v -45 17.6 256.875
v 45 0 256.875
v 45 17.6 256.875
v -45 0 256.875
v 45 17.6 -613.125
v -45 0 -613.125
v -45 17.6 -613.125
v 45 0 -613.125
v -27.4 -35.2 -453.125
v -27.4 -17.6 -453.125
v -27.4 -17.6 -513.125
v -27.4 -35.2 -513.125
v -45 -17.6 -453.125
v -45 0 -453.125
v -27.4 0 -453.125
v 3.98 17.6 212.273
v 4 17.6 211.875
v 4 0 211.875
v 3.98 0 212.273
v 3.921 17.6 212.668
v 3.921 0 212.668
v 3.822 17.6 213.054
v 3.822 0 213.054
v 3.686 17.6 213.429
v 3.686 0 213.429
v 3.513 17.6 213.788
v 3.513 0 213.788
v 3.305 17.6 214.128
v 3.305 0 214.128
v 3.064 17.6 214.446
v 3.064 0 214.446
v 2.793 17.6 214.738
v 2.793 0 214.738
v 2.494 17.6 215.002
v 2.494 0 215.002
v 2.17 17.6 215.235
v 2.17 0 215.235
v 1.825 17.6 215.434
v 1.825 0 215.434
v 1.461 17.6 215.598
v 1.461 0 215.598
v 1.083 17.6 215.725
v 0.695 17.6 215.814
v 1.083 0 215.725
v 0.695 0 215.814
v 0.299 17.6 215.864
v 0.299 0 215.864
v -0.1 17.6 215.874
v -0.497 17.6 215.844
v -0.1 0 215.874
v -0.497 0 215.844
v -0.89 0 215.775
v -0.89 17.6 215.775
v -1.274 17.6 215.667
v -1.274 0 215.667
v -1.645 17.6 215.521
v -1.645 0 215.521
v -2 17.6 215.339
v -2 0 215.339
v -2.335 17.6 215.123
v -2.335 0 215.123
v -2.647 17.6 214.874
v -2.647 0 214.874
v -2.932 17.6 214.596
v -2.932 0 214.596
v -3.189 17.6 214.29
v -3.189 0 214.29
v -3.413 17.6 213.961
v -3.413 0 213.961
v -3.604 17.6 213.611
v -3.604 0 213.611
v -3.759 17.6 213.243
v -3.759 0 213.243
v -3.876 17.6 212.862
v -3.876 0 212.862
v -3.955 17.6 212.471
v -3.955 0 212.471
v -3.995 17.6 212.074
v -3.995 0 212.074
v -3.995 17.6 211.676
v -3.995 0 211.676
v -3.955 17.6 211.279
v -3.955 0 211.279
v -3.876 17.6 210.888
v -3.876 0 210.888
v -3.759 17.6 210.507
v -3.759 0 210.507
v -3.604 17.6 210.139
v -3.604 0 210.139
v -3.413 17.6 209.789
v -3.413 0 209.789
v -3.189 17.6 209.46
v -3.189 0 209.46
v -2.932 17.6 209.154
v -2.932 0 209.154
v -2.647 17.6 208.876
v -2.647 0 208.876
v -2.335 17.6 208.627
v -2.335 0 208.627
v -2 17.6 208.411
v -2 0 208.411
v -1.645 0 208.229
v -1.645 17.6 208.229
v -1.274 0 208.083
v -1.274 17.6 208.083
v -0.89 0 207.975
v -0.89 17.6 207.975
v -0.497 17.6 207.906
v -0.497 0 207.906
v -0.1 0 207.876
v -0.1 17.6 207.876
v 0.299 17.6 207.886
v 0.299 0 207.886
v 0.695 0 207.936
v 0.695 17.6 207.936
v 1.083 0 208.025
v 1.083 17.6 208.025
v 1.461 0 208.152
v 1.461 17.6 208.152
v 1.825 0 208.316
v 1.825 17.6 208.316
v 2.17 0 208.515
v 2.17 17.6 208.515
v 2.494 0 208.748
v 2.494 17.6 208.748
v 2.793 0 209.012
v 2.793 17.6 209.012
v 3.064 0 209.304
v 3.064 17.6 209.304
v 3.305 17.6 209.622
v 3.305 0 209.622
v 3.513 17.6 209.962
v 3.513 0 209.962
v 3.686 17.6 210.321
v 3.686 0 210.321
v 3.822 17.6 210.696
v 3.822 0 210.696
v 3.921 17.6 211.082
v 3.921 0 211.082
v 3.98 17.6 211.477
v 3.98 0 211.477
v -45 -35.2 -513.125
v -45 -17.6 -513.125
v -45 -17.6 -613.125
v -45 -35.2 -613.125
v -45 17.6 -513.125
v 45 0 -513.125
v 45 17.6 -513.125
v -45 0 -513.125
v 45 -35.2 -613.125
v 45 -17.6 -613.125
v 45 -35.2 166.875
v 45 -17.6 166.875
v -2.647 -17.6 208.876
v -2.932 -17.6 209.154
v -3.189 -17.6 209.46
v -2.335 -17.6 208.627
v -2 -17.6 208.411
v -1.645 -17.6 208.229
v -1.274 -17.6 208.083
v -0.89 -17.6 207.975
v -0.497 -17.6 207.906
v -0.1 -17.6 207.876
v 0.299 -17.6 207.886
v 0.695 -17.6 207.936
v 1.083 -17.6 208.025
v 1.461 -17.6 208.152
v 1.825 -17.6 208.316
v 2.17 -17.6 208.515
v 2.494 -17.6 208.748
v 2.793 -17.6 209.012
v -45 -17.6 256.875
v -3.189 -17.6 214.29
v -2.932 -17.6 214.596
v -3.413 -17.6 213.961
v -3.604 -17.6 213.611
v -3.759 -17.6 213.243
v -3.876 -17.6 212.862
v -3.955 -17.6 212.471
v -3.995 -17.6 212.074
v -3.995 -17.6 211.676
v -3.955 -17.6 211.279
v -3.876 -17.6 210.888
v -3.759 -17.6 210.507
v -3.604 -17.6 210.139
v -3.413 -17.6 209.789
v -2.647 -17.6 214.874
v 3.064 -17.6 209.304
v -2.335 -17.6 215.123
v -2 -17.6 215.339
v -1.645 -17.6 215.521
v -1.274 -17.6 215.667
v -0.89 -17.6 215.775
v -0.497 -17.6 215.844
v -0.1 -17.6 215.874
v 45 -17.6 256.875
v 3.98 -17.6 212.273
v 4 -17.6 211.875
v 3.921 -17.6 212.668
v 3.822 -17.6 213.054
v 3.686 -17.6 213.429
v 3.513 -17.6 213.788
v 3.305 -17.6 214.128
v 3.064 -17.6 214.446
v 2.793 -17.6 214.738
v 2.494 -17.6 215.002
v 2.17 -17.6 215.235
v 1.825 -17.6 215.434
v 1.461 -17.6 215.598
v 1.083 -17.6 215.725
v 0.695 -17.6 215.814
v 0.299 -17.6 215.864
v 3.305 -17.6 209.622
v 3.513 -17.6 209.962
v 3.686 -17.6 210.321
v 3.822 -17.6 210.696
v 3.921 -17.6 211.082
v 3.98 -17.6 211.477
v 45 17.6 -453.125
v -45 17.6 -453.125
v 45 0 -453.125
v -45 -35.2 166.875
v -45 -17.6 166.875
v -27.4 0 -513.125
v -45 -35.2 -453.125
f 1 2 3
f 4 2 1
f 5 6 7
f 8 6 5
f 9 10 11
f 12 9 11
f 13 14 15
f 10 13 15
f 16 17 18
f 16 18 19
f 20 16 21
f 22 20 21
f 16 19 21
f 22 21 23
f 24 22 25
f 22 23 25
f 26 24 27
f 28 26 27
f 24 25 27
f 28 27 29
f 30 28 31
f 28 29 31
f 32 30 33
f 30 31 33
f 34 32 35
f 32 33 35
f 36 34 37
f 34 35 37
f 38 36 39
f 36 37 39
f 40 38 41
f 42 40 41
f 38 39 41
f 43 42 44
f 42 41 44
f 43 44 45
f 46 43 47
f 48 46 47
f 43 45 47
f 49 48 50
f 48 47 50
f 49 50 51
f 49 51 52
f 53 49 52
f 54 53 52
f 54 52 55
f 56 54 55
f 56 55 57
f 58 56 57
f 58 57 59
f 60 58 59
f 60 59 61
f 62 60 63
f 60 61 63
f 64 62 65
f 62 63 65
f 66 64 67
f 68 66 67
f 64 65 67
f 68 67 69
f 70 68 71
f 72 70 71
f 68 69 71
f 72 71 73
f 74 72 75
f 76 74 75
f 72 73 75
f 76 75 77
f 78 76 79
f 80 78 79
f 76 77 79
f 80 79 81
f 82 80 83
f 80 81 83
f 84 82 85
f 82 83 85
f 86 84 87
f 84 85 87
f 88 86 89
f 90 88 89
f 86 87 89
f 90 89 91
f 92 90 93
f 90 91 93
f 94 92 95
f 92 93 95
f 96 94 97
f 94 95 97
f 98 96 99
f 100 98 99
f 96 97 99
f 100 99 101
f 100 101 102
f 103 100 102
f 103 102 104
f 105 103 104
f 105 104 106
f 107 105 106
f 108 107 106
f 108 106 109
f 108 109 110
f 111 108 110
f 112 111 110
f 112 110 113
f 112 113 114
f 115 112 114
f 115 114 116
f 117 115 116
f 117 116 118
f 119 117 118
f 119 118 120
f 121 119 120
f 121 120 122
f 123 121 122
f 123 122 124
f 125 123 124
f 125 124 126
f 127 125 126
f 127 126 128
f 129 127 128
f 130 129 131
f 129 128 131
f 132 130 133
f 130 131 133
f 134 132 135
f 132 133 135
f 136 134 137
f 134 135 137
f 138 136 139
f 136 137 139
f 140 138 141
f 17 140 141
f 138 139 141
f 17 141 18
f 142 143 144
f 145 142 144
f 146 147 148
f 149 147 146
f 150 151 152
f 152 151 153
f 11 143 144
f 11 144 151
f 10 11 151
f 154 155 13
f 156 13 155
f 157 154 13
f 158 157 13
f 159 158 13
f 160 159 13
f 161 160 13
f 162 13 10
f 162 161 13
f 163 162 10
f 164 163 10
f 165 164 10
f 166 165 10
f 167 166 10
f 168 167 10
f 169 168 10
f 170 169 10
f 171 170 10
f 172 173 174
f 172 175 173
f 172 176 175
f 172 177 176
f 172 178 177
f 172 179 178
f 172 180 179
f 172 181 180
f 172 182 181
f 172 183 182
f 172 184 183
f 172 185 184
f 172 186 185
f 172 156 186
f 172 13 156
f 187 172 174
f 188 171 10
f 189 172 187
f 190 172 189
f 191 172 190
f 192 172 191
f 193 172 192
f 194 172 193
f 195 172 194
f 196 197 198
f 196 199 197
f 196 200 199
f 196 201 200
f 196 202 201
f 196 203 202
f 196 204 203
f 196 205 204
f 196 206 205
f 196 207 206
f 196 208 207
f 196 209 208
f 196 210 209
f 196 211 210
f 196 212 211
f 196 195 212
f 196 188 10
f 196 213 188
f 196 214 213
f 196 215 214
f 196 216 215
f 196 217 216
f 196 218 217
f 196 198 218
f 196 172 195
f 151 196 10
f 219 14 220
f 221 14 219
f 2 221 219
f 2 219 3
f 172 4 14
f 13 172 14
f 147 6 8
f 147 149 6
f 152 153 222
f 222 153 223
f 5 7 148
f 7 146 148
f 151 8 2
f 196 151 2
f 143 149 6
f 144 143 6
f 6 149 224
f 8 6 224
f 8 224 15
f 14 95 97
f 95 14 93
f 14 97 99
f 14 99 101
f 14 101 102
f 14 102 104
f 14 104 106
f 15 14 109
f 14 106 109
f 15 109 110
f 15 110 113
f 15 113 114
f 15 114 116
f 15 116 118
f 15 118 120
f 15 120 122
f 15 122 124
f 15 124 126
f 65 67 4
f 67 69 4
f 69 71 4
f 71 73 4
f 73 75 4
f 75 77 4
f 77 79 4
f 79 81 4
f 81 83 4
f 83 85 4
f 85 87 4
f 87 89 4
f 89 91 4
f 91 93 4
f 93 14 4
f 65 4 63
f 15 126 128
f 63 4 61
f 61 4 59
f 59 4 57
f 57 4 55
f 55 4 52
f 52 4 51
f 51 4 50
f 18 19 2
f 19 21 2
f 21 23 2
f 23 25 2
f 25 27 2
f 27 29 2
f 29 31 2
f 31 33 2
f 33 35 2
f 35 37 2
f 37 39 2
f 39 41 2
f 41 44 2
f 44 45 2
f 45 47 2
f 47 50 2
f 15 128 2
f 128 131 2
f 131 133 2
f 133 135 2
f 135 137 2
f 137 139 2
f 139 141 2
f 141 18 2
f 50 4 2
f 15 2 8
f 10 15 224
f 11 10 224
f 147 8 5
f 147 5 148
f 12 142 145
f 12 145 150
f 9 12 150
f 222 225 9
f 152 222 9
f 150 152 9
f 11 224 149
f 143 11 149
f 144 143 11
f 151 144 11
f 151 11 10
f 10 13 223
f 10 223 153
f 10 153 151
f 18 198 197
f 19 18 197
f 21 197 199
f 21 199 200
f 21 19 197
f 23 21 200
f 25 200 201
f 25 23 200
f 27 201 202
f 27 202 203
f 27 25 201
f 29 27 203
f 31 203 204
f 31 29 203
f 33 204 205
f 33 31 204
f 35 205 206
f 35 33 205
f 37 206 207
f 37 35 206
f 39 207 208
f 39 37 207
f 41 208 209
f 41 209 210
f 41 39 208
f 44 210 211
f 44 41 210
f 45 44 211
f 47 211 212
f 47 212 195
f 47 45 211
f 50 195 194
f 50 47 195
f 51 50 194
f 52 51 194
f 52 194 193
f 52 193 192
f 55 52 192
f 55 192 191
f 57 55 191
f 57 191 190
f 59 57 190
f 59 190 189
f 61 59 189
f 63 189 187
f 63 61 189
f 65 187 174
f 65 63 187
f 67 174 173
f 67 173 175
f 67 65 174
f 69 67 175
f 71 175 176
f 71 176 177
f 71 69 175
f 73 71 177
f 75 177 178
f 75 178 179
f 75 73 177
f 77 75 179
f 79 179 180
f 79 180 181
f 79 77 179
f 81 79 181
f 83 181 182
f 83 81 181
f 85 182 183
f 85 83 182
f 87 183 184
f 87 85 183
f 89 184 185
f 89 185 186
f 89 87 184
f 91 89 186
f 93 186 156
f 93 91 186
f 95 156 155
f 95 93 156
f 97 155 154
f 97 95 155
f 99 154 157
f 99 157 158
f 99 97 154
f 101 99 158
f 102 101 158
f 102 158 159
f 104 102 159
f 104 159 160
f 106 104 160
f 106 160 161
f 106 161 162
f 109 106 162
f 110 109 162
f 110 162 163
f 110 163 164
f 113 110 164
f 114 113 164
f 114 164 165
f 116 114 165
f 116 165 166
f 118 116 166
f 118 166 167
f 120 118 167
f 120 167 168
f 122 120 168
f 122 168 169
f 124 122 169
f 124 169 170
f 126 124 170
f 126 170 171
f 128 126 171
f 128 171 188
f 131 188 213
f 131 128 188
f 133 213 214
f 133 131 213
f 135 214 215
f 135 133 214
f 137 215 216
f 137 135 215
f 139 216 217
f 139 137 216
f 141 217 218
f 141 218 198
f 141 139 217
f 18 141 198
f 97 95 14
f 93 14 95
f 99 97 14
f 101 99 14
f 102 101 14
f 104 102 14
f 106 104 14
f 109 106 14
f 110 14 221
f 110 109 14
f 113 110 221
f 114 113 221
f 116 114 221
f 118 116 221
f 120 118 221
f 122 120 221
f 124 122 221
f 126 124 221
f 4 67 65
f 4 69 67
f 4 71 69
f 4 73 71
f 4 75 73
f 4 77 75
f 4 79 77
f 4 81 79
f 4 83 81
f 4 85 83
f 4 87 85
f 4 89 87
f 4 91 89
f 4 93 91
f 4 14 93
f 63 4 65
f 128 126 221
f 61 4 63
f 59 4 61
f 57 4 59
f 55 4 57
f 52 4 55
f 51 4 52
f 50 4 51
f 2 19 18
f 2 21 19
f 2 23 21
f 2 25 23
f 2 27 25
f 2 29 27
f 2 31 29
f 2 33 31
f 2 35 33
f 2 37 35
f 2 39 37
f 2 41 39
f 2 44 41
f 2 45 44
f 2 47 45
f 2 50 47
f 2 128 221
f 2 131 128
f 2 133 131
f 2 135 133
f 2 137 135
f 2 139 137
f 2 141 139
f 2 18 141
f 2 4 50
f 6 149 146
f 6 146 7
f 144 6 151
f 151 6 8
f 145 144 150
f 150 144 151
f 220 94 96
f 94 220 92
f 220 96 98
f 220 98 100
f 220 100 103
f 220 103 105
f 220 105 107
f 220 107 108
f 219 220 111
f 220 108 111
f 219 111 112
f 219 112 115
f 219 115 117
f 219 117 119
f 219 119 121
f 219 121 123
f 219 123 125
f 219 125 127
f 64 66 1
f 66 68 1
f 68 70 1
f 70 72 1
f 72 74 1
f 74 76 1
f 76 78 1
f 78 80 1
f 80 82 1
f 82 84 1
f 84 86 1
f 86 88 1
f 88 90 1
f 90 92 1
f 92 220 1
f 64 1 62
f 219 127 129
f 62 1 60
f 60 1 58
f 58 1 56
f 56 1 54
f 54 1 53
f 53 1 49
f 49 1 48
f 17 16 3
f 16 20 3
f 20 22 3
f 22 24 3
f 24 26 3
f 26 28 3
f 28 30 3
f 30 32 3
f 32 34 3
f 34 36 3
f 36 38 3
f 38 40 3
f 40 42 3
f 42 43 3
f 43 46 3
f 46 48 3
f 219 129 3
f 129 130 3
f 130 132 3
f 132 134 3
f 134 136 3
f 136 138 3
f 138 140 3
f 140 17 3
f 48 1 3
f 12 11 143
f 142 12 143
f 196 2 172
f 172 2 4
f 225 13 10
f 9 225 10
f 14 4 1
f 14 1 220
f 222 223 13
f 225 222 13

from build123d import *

# Parameters (mm, degrees)
F1_R     = 4
F2_DEPTH = 17.6
F4_DEPTH = 17.6
F5_R     = 4
F6_DEPTH = 17.6


with BuildPart() as f2:
    # F1 (on Front) → F2 (new body)
    with BuildSketch(Plane.XZ):
        Polygon((45, 256.875), (-45, 256.875), (-45, -453.125), (-27.4, -453.125), (-27.4, -513.125), (-45, -513.125), (-45, -613.125), (45, -613.125), align=None)
        with Locations((0, 211.875)):
            Circle(F1_R, mode=Mode.SUBTRACT)
    extrude(amount=F2_DEPTH)


with BuildPart() as f4:
    # F3 (on face) → F4 (new body)
    with BuildSketch(Plane.XZ.offset(17.6)):
        Polygon((45, 166.875), (-45, 166.875), (-45, -453.125), (-27.4, -453.125), (-27.4, -513.125), (-45, -513.125), (-45, -613.125), (45, -613.125), align=None)
    extrude(amount=F4_DEPTH)


with BuildPart() as f6:
    # F5 (on Front) → F6 (new body)
    with BuildSketch(Plane.XZ):
        Polygon((45, 256.875), (-45, 256.875), (-45, -453.125), (-27.4, -453.125), (45, -453.125), align=None)
        with Locations((0, 211.875)):
            Circle(F5_R, mode=Mode.SUBTRACT)
    extrude(amount=-F6_DEPTH)


with BuildPart() as f6b:
    # F5 (on Front) → F6, piece 2 (new body)
    with BuildSketch(Plane.XZ):
        Polygon((-45, -613.125), (45, -613.125), (45, -513.125), (-27.4, -513.125), (-45, -513.125), align=None)
    extrude(amount=-F6_DEPTH)


solid = Compound([f2.part, f4.part, f6.part, f6b.part])
